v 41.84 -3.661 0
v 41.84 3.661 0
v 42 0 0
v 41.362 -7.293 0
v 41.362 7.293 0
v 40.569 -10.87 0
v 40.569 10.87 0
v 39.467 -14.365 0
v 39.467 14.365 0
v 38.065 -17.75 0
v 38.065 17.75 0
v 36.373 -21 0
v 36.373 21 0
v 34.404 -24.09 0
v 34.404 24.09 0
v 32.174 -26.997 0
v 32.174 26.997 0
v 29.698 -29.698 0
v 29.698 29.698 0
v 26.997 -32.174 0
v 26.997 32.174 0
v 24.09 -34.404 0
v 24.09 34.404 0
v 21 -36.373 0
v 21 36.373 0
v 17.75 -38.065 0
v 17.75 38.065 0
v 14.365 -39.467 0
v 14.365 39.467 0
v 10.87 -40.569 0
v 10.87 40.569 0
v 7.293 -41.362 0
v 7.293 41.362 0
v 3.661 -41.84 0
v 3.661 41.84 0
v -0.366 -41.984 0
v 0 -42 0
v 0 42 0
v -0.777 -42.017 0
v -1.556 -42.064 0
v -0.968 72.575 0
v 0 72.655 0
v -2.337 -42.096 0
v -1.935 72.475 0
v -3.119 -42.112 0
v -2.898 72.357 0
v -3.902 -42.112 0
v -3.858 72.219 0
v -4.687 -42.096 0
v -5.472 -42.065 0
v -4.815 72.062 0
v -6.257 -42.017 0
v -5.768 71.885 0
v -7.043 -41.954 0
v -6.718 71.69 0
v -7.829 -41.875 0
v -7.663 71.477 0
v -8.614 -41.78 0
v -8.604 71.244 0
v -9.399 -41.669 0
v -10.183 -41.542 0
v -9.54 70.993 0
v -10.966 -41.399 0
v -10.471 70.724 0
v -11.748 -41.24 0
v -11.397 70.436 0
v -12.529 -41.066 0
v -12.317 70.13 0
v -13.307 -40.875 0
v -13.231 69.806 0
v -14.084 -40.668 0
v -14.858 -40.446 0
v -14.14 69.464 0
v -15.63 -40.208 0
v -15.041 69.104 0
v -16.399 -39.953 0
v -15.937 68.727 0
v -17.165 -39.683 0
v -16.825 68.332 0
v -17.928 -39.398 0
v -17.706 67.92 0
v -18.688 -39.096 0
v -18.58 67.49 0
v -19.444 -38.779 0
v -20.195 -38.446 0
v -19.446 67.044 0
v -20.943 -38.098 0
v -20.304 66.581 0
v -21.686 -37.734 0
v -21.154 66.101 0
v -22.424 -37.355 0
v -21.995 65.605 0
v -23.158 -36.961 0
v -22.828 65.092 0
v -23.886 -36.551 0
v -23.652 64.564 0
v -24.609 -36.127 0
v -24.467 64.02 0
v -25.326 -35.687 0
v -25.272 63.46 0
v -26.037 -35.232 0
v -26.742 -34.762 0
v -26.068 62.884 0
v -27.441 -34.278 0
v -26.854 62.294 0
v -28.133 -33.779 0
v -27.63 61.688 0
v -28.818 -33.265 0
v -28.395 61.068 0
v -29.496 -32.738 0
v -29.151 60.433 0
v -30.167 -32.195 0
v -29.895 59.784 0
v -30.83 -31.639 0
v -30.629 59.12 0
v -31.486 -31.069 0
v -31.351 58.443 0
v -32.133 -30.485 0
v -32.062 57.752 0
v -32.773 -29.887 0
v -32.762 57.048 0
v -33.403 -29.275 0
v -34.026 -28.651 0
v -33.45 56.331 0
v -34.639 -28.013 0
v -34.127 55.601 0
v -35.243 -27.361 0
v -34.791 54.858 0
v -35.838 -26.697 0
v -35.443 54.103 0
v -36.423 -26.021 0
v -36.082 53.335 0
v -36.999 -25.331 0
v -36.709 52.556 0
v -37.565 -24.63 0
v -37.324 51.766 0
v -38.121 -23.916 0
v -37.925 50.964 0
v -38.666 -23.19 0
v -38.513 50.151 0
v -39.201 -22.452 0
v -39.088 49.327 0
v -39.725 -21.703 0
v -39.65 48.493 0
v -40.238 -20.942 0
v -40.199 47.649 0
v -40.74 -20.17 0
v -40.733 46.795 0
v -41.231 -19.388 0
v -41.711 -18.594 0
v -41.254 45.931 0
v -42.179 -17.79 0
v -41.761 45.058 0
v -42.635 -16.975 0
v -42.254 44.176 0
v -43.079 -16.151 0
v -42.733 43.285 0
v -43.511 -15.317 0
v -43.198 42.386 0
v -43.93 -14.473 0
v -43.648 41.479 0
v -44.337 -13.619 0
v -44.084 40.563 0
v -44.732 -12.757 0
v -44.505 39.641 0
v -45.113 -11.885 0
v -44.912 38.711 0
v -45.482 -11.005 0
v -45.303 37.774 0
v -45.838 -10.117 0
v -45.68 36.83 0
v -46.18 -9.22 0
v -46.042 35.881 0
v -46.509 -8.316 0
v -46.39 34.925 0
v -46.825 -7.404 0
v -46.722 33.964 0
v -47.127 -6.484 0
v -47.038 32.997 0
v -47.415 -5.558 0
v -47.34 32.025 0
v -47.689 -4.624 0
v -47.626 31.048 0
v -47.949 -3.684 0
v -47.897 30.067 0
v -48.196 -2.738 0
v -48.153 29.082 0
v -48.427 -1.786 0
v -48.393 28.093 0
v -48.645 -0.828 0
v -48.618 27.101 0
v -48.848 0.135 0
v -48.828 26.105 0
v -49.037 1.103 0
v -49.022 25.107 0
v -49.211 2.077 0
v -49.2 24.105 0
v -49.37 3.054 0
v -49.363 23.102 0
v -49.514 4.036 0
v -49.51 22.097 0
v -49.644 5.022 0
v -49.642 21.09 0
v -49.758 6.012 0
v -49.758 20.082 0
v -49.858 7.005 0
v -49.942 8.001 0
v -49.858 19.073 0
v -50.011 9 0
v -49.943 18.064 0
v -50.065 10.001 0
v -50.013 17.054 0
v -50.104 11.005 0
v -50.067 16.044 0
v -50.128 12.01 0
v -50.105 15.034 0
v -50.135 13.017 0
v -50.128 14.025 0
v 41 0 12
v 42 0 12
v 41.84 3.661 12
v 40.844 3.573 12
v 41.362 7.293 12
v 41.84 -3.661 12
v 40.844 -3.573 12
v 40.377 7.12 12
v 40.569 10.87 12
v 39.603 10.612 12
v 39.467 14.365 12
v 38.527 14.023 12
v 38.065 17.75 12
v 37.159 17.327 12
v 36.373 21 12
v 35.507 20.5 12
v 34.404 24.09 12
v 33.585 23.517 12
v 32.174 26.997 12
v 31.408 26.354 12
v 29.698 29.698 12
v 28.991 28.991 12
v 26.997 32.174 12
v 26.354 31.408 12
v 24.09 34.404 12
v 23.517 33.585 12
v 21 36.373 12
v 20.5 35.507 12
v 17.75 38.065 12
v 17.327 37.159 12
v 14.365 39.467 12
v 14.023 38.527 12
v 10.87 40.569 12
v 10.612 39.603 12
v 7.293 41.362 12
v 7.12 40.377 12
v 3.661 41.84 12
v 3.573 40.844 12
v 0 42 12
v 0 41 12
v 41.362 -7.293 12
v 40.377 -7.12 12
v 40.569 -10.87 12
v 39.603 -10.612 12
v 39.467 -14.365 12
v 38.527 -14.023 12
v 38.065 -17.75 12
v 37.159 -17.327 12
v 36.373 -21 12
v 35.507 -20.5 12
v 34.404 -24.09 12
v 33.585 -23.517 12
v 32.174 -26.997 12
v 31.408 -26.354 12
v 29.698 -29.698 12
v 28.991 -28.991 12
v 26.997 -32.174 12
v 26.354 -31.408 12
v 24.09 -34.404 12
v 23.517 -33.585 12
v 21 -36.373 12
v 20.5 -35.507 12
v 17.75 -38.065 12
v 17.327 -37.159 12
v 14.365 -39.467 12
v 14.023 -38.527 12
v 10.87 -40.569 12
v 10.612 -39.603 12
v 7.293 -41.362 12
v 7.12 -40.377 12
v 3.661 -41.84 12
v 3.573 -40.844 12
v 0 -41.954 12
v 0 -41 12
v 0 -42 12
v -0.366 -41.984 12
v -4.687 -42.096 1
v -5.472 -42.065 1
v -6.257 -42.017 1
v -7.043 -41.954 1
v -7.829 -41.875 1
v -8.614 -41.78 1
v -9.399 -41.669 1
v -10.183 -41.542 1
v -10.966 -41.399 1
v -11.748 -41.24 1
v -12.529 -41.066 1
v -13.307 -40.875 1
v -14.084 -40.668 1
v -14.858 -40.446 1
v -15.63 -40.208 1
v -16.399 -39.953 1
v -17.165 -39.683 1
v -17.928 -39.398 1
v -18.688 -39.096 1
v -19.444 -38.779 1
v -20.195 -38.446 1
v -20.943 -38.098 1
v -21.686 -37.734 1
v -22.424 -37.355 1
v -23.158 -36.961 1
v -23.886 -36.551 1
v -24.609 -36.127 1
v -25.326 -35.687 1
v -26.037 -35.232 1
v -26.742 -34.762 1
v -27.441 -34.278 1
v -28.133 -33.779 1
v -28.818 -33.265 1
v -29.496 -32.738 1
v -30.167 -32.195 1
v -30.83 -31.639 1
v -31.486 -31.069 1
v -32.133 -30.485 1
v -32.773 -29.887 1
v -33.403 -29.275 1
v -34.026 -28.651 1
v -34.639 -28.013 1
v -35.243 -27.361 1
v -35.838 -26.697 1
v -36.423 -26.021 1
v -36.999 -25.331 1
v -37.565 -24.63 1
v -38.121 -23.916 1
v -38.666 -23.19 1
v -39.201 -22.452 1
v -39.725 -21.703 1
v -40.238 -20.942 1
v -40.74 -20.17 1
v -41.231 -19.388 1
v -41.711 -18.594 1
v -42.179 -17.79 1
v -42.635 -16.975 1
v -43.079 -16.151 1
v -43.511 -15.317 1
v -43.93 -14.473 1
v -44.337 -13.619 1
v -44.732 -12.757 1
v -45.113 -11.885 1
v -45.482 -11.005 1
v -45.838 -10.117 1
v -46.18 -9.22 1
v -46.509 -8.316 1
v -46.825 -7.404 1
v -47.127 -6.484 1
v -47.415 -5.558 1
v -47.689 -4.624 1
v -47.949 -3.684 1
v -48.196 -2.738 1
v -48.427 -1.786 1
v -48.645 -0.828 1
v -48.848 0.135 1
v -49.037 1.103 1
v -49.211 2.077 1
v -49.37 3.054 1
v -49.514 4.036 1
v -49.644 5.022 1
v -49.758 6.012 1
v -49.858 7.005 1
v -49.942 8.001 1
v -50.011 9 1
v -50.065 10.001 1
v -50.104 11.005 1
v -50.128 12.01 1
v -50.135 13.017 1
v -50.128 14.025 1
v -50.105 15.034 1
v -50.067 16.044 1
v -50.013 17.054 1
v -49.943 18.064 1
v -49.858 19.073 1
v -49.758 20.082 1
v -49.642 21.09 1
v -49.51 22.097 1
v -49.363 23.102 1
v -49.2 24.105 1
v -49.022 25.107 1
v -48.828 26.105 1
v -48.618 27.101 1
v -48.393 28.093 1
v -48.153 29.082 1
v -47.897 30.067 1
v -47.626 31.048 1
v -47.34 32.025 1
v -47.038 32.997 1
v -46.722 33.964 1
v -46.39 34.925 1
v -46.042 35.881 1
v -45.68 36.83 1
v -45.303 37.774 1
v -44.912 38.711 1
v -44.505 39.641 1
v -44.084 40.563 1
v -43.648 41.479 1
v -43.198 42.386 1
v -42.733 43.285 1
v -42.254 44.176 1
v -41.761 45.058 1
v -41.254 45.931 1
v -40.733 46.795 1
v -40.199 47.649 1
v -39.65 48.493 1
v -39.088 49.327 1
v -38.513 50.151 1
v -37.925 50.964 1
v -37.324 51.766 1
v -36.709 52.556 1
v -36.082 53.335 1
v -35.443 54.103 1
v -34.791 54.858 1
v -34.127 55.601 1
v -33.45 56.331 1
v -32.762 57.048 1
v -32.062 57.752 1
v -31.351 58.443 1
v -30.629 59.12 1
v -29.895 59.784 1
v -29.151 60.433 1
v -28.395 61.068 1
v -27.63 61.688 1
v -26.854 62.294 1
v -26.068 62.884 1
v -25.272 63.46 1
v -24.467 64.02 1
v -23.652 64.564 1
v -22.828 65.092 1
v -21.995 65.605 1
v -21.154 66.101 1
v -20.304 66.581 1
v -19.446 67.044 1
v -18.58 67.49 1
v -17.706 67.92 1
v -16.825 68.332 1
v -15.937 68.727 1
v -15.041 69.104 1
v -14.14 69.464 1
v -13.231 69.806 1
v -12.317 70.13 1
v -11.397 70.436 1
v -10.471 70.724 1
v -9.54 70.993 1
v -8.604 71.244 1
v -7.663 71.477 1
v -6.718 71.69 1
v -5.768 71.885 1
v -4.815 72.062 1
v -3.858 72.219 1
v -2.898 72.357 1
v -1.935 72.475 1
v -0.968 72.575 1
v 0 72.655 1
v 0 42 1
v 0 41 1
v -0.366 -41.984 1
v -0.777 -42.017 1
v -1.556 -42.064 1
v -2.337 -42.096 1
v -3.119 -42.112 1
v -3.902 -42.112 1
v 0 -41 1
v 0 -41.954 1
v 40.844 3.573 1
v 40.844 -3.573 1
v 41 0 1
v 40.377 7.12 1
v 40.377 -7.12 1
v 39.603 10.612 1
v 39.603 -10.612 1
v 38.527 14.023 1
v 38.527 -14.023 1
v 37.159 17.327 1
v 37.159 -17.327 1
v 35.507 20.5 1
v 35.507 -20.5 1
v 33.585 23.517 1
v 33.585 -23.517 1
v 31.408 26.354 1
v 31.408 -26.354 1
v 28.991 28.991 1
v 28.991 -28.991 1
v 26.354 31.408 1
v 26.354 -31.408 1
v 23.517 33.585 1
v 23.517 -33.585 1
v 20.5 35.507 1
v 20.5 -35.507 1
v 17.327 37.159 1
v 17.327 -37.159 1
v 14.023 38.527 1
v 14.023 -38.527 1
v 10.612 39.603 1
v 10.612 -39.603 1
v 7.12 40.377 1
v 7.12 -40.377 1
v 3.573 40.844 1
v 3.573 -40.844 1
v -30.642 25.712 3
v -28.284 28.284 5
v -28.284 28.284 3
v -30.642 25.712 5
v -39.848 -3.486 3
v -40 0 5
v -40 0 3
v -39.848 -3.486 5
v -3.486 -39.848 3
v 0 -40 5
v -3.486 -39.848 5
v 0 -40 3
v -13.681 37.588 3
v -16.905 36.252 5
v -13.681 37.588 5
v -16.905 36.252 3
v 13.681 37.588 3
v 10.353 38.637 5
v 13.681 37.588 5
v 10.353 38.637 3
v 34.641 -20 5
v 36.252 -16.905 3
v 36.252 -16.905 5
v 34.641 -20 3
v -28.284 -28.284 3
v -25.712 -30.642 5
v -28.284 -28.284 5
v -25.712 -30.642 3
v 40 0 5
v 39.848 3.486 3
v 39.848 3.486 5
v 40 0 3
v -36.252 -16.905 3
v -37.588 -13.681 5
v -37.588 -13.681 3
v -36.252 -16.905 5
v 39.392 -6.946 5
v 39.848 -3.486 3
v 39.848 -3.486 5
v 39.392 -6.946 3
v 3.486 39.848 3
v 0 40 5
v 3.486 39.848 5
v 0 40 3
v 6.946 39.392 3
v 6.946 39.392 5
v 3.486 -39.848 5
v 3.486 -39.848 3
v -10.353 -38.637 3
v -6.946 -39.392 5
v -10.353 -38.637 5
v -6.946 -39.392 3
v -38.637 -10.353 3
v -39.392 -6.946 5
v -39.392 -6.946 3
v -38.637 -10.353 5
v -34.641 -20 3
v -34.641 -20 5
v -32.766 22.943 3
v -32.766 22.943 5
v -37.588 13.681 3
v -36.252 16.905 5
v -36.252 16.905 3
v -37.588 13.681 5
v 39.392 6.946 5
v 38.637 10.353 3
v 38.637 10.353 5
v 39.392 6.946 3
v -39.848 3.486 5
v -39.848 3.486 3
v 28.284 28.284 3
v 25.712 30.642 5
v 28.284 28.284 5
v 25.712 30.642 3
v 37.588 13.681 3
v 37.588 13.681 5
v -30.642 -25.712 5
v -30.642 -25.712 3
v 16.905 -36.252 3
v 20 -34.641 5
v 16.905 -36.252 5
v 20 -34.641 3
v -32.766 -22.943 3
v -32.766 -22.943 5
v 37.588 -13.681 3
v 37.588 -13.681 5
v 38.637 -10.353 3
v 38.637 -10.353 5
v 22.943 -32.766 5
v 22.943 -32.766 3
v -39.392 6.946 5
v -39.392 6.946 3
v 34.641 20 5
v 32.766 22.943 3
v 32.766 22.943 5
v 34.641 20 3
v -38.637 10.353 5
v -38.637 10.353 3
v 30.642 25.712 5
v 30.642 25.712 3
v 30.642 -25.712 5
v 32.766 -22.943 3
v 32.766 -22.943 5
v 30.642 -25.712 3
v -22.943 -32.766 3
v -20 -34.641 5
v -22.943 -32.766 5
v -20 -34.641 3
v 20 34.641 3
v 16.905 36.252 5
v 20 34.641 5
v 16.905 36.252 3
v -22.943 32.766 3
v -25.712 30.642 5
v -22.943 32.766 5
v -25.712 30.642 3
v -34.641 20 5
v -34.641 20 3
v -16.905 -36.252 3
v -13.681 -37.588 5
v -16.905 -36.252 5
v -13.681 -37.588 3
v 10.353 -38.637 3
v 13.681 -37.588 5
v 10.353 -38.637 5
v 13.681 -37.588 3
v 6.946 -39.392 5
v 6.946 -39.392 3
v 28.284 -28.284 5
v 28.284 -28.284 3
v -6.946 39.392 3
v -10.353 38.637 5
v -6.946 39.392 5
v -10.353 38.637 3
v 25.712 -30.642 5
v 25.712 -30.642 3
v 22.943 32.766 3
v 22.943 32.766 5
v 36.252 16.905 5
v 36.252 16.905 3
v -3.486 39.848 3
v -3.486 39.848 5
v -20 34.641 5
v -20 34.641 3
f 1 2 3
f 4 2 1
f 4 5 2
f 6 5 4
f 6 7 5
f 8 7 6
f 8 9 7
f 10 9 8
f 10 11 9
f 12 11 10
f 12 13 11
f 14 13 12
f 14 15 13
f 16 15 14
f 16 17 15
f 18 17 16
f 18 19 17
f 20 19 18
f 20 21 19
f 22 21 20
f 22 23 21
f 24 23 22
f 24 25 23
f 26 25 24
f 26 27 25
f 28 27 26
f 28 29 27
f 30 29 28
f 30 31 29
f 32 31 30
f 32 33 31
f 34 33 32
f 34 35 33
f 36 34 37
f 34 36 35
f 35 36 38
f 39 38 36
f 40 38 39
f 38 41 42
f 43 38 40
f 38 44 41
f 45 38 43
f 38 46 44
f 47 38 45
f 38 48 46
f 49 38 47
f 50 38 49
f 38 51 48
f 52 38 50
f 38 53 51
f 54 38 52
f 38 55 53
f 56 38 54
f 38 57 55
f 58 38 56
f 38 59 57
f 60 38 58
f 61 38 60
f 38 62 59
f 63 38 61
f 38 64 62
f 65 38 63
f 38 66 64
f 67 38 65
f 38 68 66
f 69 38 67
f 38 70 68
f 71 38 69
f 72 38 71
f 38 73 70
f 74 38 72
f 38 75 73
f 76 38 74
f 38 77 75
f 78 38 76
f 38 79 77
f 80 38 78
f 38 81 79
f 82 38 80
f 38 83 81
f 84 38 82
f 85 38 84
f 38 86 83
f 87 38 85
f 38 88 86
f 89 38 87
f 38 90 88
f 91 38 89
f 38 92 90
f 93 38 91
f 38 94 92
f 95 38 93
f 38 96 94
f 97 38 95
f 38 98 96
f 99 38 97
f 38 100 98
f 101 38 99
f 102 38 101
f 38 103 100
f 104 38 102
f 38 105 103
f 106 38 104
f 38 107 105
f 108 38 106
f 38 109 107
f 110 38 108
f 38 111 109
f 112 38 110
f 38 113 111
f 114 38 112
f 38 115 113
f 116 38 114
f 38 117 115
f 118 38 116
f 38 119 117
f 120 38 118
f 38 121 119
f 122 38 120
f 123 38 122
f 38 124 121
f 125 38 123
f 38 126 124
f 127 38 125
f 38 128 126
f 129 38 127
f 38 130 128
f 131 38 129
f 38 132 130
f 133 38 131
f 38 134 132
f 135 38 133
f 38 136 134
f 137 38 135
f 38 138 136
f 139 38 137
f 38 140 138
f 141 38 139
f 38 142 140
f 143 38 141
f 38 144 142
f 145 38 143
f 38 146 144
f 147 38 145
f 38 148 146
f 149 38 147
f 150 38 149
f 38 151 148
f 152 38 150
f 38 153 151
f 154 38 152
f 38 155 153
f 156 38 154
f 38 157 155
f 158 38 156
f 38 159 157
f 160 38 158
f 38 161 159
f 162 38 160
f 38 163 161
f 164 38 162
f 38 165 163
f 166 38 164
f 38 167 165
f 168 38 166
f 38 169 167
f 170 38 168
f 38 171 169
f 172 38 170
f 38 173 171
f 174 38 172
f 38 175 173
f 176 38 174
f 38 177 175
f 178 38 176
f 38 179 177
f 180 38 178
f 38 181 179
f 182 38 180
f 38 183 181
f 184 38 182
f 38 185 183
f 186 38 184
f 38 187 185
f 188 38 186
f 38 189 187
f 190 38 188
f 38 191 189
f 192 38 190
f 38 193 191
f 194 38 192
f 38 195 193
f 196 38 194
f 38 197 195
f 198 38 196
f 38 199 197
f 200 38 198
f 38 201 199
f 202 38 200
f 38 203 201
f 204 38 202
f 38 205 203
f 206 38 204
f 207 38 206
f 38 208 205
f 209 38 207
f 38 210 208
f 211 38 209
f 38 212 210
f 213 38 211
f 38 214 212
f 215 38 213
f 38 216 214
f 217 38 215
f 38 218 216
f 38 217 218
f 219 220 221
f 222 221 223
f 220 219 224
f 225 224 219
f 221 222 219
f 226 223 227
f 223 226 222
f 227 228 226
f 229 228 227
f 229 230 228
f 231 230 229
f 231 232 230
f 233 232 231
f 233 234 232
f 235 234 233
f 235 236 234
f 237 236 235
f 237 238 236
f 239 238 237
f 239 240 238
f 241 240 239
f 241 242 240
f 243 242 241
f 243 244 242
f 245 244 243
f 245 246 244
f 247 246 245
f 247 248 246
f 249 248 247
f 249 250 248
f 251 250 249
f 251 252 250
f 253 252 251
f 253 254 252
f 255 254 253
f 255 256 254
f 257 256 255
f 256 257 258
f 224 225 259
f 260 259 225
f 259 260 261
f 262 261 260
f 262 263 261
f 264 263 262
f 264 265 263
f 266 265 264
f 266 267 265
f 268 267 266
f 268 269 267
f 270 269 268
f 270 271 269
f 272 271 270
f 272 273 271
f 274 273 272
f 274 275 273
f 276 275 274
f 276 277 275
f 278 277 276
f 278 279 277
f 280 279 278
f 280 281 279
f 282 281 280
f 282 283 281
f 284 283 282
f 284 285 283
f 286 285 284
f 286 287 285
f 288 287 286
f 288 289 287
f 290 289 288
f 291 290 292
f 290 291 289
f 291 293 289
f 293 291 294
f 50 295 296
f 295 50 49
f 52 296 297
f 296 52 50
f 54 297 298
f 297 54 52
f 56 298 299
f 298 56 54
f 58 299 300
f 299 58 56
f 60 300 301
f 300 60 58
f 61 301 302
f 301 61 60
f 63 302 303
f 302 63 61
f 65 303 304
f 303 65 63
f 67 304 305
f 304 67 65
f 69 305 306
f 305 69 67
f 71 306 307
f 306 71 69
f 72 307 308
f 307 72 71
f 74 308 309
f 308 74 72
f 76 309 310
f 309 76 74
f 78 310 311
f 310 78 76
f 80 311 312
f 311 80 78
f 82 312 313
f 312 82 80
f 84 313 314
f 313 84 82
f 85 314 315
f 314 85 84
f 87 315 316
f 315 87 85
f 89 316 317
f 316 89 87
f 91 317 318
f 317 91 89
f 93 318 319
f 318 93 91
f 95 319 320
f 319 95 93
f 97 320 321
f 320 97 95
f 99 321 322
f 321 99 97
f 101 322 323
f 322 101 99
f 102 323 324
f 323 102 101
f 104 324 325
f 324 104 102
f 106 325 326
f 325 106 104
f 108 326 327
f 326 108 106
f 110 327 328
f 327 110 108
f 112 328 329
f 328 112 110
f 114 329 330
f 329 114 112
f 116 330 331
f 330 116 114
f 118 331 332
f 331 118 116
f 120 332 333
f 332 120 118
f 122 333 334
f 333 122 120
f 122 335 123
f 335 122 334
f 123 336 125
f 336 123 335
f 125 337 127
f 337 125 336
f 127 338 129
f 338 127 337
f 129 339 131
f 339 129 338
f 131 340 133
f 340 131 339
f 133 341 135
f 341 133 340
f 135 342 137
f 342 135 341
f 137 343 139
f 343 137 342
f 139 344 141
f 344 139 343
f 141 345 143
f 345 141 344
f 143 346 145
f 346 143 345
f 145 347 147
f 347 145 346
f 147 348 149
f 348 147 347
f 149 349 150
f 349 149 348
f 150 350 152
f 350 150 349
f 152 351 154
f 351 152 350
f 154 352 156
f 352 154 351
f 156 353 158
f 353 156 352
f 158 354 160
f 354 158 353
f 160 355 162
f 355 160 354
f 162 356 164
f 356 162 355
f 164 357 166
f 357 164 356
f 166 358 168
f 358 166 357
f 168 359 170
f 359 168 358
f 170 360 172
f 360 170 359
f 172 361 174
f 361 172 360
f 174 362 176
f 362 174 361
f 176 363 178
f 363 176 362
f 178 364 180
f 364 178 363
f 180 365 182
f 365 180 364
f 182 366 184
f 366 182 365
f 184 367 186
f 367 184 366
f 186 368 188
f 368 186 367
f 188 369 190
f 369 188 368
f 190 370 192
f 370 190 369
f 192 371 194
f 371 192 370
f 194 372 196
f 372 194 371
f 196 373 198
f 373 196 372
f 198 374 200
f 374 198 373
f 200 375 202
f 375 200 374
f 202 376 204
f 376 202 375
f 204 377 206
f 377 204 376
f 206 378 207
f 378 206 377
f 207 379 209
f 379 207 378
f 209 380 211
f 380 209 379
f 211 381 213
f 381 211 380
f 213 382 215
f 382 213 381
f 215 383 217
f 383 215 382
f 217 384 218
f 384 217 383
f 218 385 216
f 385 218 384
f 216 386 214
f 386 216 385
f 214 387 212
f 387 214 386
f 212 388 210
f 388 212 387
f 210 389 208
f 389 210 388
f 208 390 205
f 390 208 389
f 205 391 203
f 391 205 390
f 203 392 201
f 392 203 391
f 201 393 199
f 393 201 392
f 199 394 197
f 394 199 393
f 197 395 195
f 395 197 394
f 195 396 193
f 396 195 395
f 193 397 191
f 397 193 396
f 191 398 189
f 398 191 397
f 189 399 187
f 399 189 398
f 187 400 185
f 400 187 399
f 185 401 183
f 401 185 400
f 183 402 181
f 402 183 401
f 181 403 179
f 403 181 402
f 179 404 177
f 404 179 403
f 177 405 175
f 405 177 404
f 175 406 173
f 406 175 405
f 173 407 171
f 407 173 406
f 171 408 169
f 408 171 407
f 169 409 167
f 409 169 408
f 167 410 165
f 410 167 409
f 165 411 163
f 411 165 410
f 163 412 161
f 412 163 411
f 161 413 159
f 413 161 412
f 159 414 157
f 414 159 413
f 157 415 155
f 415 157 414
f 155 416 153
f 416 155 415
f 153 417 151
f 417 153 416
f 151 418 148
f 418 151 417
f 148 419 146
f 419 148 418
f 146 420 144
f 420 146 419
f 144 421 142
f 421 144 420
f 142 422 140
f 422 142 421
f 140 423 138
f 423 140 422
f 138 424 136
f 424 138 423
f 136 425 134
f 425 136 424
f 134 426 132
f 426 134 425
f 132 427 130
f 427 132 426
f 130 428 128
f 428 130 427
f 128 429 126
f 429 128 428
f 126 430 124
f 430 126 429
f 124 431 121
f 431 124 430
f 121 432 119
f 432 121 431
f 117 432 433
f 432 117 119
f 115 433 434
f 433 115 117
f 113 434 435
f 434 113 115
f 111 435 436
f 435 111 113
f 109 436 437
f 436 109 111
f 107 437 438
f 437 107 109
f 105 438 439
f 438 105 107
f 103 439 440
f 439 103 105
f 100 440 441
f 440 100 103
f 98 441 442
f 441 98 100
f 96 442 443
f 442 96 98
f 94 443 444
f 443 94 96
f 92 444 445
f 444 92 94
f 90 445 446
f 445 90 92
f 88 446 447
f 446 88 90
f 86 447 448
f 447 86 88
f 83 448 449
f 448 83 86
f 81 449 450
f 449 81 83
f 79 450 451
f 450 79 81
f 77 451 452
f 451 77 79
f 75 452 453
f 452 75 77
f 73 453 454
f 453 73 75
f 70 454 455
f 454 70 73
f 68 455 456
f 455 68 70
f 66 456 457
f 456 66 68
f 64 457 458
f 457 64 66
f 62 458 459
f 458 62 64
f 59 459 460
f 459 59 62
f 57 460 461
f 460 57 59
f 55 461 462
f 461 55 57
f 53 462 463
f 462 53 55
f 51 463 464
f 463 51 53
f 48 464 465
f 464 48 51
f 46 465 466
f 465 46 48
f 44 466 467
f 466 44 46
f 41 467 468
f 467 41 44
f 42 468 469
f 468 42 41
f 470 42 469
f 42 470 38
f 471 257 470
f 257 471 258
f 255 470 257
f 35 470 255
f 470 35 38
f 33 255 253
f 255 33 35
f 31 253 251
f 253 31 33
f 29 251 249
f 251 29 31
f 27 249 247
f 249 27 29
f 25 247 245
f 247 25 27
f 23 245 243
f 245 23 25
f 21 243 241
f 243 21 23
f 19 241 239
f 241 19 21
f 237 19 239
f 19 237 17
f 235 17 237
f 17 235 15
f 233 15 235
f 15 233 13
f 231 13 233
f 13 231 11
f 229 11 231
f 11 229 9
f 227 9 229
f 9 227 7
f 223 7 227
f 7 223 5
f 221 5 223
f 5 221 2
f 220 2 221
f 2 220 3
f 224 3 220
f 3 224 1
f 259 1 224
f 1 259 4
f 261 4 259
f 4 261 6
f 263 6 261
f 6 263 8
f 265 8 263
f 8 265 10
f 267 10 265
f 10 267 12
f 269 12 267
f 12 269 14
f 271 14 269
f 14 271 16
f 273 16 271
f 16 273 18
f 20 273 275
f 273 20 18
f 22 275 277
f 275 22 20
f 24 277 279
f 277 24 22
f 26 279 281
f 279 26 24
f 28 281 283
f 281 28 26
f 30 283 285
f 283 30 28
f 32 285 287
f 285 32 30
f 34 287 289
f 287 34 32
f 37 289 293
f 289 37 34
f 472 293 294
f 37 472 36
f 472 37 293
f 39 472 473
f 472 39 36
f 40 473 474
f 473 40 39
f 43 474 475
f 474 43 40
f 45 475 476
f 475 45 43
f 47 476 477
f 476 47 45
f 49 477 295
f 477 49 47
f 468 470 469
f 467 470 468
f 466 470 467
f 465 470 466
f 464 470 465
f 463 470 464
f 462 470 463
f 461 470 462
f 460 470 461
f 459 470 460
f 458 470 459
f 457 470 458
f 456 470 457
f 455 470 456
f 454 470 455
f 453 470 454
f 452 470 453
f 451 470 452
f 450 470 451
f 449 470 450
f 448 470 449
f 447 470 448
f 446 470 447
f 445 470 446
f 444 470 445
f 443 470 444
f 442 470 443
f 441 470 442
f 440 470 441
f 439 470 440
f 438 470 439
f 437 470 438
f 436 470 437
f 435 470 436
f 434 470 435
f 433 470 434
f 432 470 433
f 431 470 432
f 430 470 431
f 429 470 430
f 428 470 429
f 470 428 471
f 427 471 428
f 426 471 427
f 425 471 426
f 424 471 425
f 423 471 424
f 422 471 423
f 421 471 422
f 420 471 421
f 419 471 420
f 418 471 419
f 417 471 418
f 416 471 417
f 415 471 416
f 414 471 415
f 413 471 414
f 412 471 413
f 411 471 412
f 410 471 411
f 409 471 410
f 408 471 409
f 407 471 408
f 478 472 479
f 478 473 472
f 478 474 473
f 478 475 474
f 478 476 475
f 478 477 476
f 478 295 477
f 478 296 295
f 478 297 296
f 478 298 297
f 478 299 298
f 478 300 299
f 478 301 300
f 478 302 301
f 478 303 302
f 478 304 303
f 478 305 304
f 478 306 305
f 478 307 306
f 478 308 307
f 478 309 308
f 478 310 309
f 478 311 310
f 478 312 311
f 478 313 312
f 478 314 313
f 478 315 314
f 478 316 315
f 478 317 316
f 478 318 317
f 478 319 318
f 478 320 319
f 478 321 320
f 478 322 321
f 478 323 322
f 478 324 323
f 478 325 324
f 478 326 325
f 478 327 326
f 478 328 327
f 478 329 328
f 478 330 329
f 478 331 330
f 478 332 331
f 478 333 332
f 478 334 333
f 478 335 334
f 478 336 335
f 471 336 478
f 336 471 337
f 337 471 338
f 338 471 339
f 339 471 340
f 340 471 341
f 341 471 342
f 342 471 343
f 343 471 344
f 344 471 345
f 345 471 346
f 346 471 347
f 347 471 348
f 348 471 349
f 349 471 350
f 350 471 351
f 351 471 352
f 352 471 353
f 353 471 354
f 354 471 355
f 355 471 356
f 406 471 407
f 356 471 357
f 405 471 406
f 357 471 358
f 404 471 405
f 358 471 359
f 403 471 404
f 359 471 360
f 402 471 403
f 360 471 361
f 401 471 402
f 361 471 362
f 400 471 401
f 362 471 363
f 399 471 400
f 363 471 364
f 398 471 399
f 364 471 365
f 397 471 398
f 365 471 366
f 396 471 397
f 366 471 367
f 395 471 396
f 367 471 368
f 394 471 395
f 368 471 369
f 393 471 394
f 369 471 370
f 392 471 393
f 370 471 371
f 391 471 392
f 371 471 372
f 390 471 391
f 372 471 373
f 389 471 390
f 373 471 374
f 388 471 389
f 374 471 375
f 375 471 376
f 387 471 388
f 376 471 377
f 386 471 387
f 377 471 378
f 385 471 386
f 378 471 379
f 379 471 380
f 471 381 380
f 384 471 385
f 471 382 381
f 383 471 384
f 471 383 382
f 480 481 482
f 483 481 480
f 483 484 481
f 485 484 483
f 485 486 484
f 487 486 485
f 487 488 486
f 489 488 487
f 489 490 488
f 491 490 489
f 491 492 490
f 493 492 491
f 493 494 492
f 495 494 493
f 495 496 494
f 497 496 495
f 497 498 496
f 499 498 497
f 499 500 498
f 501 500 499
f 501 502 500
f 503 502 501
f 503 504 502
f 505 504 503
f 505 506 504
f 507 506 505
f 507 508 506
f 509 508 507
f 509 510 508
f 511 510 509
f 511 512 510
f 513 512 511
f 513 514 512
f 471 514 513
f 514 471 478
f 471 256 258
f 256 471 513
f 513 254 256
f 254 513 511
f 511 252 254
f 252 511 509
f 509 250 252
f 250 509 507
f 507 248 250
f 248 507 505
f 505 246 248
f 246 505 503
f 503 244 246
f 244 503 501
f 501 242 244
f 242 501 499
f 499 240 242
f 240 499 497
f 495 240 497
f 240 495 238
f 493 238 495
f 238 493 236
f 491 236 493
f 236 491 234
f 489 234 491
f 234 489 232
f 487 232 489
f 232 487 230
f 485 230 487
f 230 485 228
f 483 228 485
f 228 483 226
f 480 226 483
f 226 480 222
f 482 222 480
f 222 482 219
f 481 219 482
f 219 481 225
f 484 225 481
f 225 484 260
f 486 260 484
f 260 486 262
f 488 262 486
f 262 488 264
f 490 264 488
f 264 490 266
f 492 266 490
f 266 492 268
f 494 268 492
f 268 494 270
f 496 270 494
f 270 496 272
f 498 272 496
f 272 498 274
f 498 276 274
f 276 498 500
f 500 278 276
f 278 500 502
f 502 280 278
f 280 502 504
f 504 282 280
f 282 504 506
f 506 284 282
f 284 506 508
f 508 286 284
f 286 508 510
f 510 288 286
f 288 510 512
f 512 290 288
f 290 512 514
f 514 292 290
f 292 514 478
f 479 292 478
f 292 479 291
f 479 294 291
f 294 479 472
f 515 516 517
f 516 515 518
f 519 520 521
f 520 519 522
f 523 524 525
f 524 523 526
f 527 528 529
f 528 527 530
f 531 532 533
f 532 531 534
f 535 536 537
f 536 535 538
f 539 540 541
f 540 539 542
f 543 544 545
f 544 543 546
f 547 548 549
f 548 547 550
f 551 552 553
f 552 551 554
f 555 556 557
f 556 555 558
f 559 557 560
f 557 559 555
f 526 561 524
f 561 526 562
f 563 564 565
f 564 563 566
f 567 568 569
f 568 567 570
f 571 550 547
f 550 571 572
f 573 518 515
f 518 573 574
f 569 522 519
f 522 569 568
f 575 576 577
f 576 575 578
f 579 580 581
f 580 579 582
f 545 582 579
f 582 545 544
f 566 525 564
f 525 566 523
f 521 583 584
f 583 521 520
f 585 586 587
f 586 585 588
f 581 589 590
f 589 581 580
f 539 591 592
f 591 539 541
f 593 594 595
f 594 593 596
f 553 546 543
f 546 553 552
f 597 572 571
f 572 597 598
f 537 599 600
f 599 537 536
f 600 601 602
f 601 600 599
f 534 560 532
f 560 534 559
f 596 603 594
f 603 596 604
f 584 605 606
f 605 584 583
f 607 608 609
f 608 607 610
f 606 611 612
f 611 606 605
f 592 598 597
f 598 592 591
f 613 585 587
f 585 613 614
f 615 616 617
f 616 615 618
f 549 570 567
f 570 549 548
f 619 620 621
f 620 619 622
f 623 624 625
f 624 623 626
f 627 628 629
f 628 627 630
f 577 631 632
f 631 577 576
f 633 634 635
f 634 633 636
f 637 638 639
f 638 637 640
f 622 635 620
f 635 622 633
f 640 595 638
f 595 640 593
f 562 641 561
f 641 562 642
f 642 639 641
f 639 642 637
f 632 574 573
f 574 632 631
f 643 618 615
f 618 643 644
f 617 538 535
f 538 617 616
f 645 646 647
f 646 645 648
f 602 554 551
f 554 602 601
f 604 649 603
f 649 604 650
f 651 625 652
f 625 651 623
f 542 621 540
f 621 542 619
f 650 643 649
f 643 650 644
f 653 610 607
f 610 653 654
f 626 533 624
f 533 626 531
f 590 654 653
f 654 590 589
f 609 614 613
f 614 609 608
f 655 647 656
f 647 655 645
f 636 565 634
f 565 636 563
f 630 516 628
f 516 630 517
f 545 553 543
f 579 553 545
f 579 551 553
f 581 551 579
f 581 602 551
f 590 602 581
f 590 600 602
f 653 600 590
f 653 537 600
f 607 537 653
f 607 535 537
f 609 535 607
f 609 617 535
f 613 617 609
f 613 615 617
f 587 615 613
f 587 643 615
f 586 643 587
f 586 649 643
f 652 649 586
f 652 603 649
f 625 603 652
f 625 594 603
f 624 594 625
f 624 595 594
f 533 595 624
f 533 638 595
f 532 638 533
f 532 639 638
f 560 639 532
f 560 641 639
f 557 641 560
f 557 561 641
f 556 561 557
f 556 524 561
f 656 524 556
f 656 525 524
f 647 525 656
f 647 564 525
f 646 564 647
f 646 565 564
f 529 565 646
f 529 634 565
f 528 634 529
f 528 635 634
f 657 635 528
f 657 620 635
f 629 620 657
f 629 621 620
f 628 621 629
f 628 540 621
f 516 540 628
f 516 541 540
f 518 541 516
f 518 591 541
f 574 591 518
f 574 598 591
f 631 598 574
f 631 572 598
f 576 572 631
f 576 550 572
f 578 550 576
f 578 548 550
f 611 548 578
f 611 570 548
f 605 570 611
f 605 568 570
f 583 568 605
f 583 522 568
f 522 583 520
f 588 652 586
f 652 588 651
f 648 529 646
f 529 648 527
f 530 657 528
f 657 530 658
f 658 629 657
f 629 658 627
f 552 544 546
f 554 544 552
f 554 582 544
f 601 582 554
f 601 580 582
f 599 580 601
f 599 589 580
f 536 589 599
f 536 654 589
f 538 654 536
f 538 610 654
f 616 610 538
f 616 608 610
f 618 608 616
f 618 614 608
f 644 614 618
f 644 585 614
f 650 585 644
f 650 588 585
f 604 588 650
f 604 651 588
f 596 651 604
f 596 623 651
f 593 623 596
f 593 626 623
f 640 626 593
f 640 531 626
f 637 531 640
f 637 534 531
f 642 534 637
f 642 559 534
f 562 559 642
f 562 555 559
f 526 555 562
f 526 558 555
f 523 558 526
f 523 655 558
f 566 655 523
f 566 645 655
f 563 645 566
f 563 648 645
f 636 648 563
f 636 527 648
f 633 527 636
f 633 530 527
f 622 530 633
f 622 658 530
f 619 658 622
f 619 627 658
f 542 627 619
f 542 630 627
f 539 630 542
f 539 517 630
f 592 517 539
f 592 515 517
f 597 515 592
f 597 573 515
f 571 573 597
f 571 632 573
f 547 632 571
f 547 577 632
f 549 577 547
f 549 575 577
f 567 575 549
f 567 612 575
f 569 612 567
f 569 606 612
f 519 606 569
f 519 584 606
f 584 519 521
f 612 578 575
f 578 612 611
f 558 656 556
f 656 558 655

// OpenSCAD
$fa = 5;
$fs = 0.01;

module basewall(height=20, radius=42)
{
    spiral = 
        [
            for (i=[720:900])[
                (0.3 + 0.16*i)*sin(i)*1.1,
                (0.3 + 0.14*i)*cos(i)*1.2
            ]
        ];
    color("grey")linear_extrude(height)union()
    {
        color("grey")circle(radius);
        elipse = 1.2*radius;
//        translate([0,elipse-radius])
//        {  
//            difference()
//            {
//                //elipse type:
//                color("green")resize([radius*2, elipse*2])circle(r=radius+1);
//                color("red")translate([0,-((elipse+2))])square([radius+2, 2*(elipse+2)]);
                
                //spiral type:
                
                translate([0,9, 30])mirror([0,1])scale([0.35, 0.42])color("green")polygon(concat(spiral));
//                translate([0,6])mirror([0,1])scale([0.35, 0.35])color("green")polygon(concat(spiral));
                    
//            }
//        }
    }
}
//

module base (height = 20, radius = 42, thickness = 1)
{
    difference()
    {
        basewall(height, radius);
        translate([0, 0, thickness])color("blue")basewall(height, radius-thickness);
    }
}
//


radius=42;    height=12;    thickness=1;
mirror([1,0]){
    translate([0, 0, thickness + 2])color("orange")linear_extrude(2)circle(radius - 2);
    base(height, radius, thickness); 
}
